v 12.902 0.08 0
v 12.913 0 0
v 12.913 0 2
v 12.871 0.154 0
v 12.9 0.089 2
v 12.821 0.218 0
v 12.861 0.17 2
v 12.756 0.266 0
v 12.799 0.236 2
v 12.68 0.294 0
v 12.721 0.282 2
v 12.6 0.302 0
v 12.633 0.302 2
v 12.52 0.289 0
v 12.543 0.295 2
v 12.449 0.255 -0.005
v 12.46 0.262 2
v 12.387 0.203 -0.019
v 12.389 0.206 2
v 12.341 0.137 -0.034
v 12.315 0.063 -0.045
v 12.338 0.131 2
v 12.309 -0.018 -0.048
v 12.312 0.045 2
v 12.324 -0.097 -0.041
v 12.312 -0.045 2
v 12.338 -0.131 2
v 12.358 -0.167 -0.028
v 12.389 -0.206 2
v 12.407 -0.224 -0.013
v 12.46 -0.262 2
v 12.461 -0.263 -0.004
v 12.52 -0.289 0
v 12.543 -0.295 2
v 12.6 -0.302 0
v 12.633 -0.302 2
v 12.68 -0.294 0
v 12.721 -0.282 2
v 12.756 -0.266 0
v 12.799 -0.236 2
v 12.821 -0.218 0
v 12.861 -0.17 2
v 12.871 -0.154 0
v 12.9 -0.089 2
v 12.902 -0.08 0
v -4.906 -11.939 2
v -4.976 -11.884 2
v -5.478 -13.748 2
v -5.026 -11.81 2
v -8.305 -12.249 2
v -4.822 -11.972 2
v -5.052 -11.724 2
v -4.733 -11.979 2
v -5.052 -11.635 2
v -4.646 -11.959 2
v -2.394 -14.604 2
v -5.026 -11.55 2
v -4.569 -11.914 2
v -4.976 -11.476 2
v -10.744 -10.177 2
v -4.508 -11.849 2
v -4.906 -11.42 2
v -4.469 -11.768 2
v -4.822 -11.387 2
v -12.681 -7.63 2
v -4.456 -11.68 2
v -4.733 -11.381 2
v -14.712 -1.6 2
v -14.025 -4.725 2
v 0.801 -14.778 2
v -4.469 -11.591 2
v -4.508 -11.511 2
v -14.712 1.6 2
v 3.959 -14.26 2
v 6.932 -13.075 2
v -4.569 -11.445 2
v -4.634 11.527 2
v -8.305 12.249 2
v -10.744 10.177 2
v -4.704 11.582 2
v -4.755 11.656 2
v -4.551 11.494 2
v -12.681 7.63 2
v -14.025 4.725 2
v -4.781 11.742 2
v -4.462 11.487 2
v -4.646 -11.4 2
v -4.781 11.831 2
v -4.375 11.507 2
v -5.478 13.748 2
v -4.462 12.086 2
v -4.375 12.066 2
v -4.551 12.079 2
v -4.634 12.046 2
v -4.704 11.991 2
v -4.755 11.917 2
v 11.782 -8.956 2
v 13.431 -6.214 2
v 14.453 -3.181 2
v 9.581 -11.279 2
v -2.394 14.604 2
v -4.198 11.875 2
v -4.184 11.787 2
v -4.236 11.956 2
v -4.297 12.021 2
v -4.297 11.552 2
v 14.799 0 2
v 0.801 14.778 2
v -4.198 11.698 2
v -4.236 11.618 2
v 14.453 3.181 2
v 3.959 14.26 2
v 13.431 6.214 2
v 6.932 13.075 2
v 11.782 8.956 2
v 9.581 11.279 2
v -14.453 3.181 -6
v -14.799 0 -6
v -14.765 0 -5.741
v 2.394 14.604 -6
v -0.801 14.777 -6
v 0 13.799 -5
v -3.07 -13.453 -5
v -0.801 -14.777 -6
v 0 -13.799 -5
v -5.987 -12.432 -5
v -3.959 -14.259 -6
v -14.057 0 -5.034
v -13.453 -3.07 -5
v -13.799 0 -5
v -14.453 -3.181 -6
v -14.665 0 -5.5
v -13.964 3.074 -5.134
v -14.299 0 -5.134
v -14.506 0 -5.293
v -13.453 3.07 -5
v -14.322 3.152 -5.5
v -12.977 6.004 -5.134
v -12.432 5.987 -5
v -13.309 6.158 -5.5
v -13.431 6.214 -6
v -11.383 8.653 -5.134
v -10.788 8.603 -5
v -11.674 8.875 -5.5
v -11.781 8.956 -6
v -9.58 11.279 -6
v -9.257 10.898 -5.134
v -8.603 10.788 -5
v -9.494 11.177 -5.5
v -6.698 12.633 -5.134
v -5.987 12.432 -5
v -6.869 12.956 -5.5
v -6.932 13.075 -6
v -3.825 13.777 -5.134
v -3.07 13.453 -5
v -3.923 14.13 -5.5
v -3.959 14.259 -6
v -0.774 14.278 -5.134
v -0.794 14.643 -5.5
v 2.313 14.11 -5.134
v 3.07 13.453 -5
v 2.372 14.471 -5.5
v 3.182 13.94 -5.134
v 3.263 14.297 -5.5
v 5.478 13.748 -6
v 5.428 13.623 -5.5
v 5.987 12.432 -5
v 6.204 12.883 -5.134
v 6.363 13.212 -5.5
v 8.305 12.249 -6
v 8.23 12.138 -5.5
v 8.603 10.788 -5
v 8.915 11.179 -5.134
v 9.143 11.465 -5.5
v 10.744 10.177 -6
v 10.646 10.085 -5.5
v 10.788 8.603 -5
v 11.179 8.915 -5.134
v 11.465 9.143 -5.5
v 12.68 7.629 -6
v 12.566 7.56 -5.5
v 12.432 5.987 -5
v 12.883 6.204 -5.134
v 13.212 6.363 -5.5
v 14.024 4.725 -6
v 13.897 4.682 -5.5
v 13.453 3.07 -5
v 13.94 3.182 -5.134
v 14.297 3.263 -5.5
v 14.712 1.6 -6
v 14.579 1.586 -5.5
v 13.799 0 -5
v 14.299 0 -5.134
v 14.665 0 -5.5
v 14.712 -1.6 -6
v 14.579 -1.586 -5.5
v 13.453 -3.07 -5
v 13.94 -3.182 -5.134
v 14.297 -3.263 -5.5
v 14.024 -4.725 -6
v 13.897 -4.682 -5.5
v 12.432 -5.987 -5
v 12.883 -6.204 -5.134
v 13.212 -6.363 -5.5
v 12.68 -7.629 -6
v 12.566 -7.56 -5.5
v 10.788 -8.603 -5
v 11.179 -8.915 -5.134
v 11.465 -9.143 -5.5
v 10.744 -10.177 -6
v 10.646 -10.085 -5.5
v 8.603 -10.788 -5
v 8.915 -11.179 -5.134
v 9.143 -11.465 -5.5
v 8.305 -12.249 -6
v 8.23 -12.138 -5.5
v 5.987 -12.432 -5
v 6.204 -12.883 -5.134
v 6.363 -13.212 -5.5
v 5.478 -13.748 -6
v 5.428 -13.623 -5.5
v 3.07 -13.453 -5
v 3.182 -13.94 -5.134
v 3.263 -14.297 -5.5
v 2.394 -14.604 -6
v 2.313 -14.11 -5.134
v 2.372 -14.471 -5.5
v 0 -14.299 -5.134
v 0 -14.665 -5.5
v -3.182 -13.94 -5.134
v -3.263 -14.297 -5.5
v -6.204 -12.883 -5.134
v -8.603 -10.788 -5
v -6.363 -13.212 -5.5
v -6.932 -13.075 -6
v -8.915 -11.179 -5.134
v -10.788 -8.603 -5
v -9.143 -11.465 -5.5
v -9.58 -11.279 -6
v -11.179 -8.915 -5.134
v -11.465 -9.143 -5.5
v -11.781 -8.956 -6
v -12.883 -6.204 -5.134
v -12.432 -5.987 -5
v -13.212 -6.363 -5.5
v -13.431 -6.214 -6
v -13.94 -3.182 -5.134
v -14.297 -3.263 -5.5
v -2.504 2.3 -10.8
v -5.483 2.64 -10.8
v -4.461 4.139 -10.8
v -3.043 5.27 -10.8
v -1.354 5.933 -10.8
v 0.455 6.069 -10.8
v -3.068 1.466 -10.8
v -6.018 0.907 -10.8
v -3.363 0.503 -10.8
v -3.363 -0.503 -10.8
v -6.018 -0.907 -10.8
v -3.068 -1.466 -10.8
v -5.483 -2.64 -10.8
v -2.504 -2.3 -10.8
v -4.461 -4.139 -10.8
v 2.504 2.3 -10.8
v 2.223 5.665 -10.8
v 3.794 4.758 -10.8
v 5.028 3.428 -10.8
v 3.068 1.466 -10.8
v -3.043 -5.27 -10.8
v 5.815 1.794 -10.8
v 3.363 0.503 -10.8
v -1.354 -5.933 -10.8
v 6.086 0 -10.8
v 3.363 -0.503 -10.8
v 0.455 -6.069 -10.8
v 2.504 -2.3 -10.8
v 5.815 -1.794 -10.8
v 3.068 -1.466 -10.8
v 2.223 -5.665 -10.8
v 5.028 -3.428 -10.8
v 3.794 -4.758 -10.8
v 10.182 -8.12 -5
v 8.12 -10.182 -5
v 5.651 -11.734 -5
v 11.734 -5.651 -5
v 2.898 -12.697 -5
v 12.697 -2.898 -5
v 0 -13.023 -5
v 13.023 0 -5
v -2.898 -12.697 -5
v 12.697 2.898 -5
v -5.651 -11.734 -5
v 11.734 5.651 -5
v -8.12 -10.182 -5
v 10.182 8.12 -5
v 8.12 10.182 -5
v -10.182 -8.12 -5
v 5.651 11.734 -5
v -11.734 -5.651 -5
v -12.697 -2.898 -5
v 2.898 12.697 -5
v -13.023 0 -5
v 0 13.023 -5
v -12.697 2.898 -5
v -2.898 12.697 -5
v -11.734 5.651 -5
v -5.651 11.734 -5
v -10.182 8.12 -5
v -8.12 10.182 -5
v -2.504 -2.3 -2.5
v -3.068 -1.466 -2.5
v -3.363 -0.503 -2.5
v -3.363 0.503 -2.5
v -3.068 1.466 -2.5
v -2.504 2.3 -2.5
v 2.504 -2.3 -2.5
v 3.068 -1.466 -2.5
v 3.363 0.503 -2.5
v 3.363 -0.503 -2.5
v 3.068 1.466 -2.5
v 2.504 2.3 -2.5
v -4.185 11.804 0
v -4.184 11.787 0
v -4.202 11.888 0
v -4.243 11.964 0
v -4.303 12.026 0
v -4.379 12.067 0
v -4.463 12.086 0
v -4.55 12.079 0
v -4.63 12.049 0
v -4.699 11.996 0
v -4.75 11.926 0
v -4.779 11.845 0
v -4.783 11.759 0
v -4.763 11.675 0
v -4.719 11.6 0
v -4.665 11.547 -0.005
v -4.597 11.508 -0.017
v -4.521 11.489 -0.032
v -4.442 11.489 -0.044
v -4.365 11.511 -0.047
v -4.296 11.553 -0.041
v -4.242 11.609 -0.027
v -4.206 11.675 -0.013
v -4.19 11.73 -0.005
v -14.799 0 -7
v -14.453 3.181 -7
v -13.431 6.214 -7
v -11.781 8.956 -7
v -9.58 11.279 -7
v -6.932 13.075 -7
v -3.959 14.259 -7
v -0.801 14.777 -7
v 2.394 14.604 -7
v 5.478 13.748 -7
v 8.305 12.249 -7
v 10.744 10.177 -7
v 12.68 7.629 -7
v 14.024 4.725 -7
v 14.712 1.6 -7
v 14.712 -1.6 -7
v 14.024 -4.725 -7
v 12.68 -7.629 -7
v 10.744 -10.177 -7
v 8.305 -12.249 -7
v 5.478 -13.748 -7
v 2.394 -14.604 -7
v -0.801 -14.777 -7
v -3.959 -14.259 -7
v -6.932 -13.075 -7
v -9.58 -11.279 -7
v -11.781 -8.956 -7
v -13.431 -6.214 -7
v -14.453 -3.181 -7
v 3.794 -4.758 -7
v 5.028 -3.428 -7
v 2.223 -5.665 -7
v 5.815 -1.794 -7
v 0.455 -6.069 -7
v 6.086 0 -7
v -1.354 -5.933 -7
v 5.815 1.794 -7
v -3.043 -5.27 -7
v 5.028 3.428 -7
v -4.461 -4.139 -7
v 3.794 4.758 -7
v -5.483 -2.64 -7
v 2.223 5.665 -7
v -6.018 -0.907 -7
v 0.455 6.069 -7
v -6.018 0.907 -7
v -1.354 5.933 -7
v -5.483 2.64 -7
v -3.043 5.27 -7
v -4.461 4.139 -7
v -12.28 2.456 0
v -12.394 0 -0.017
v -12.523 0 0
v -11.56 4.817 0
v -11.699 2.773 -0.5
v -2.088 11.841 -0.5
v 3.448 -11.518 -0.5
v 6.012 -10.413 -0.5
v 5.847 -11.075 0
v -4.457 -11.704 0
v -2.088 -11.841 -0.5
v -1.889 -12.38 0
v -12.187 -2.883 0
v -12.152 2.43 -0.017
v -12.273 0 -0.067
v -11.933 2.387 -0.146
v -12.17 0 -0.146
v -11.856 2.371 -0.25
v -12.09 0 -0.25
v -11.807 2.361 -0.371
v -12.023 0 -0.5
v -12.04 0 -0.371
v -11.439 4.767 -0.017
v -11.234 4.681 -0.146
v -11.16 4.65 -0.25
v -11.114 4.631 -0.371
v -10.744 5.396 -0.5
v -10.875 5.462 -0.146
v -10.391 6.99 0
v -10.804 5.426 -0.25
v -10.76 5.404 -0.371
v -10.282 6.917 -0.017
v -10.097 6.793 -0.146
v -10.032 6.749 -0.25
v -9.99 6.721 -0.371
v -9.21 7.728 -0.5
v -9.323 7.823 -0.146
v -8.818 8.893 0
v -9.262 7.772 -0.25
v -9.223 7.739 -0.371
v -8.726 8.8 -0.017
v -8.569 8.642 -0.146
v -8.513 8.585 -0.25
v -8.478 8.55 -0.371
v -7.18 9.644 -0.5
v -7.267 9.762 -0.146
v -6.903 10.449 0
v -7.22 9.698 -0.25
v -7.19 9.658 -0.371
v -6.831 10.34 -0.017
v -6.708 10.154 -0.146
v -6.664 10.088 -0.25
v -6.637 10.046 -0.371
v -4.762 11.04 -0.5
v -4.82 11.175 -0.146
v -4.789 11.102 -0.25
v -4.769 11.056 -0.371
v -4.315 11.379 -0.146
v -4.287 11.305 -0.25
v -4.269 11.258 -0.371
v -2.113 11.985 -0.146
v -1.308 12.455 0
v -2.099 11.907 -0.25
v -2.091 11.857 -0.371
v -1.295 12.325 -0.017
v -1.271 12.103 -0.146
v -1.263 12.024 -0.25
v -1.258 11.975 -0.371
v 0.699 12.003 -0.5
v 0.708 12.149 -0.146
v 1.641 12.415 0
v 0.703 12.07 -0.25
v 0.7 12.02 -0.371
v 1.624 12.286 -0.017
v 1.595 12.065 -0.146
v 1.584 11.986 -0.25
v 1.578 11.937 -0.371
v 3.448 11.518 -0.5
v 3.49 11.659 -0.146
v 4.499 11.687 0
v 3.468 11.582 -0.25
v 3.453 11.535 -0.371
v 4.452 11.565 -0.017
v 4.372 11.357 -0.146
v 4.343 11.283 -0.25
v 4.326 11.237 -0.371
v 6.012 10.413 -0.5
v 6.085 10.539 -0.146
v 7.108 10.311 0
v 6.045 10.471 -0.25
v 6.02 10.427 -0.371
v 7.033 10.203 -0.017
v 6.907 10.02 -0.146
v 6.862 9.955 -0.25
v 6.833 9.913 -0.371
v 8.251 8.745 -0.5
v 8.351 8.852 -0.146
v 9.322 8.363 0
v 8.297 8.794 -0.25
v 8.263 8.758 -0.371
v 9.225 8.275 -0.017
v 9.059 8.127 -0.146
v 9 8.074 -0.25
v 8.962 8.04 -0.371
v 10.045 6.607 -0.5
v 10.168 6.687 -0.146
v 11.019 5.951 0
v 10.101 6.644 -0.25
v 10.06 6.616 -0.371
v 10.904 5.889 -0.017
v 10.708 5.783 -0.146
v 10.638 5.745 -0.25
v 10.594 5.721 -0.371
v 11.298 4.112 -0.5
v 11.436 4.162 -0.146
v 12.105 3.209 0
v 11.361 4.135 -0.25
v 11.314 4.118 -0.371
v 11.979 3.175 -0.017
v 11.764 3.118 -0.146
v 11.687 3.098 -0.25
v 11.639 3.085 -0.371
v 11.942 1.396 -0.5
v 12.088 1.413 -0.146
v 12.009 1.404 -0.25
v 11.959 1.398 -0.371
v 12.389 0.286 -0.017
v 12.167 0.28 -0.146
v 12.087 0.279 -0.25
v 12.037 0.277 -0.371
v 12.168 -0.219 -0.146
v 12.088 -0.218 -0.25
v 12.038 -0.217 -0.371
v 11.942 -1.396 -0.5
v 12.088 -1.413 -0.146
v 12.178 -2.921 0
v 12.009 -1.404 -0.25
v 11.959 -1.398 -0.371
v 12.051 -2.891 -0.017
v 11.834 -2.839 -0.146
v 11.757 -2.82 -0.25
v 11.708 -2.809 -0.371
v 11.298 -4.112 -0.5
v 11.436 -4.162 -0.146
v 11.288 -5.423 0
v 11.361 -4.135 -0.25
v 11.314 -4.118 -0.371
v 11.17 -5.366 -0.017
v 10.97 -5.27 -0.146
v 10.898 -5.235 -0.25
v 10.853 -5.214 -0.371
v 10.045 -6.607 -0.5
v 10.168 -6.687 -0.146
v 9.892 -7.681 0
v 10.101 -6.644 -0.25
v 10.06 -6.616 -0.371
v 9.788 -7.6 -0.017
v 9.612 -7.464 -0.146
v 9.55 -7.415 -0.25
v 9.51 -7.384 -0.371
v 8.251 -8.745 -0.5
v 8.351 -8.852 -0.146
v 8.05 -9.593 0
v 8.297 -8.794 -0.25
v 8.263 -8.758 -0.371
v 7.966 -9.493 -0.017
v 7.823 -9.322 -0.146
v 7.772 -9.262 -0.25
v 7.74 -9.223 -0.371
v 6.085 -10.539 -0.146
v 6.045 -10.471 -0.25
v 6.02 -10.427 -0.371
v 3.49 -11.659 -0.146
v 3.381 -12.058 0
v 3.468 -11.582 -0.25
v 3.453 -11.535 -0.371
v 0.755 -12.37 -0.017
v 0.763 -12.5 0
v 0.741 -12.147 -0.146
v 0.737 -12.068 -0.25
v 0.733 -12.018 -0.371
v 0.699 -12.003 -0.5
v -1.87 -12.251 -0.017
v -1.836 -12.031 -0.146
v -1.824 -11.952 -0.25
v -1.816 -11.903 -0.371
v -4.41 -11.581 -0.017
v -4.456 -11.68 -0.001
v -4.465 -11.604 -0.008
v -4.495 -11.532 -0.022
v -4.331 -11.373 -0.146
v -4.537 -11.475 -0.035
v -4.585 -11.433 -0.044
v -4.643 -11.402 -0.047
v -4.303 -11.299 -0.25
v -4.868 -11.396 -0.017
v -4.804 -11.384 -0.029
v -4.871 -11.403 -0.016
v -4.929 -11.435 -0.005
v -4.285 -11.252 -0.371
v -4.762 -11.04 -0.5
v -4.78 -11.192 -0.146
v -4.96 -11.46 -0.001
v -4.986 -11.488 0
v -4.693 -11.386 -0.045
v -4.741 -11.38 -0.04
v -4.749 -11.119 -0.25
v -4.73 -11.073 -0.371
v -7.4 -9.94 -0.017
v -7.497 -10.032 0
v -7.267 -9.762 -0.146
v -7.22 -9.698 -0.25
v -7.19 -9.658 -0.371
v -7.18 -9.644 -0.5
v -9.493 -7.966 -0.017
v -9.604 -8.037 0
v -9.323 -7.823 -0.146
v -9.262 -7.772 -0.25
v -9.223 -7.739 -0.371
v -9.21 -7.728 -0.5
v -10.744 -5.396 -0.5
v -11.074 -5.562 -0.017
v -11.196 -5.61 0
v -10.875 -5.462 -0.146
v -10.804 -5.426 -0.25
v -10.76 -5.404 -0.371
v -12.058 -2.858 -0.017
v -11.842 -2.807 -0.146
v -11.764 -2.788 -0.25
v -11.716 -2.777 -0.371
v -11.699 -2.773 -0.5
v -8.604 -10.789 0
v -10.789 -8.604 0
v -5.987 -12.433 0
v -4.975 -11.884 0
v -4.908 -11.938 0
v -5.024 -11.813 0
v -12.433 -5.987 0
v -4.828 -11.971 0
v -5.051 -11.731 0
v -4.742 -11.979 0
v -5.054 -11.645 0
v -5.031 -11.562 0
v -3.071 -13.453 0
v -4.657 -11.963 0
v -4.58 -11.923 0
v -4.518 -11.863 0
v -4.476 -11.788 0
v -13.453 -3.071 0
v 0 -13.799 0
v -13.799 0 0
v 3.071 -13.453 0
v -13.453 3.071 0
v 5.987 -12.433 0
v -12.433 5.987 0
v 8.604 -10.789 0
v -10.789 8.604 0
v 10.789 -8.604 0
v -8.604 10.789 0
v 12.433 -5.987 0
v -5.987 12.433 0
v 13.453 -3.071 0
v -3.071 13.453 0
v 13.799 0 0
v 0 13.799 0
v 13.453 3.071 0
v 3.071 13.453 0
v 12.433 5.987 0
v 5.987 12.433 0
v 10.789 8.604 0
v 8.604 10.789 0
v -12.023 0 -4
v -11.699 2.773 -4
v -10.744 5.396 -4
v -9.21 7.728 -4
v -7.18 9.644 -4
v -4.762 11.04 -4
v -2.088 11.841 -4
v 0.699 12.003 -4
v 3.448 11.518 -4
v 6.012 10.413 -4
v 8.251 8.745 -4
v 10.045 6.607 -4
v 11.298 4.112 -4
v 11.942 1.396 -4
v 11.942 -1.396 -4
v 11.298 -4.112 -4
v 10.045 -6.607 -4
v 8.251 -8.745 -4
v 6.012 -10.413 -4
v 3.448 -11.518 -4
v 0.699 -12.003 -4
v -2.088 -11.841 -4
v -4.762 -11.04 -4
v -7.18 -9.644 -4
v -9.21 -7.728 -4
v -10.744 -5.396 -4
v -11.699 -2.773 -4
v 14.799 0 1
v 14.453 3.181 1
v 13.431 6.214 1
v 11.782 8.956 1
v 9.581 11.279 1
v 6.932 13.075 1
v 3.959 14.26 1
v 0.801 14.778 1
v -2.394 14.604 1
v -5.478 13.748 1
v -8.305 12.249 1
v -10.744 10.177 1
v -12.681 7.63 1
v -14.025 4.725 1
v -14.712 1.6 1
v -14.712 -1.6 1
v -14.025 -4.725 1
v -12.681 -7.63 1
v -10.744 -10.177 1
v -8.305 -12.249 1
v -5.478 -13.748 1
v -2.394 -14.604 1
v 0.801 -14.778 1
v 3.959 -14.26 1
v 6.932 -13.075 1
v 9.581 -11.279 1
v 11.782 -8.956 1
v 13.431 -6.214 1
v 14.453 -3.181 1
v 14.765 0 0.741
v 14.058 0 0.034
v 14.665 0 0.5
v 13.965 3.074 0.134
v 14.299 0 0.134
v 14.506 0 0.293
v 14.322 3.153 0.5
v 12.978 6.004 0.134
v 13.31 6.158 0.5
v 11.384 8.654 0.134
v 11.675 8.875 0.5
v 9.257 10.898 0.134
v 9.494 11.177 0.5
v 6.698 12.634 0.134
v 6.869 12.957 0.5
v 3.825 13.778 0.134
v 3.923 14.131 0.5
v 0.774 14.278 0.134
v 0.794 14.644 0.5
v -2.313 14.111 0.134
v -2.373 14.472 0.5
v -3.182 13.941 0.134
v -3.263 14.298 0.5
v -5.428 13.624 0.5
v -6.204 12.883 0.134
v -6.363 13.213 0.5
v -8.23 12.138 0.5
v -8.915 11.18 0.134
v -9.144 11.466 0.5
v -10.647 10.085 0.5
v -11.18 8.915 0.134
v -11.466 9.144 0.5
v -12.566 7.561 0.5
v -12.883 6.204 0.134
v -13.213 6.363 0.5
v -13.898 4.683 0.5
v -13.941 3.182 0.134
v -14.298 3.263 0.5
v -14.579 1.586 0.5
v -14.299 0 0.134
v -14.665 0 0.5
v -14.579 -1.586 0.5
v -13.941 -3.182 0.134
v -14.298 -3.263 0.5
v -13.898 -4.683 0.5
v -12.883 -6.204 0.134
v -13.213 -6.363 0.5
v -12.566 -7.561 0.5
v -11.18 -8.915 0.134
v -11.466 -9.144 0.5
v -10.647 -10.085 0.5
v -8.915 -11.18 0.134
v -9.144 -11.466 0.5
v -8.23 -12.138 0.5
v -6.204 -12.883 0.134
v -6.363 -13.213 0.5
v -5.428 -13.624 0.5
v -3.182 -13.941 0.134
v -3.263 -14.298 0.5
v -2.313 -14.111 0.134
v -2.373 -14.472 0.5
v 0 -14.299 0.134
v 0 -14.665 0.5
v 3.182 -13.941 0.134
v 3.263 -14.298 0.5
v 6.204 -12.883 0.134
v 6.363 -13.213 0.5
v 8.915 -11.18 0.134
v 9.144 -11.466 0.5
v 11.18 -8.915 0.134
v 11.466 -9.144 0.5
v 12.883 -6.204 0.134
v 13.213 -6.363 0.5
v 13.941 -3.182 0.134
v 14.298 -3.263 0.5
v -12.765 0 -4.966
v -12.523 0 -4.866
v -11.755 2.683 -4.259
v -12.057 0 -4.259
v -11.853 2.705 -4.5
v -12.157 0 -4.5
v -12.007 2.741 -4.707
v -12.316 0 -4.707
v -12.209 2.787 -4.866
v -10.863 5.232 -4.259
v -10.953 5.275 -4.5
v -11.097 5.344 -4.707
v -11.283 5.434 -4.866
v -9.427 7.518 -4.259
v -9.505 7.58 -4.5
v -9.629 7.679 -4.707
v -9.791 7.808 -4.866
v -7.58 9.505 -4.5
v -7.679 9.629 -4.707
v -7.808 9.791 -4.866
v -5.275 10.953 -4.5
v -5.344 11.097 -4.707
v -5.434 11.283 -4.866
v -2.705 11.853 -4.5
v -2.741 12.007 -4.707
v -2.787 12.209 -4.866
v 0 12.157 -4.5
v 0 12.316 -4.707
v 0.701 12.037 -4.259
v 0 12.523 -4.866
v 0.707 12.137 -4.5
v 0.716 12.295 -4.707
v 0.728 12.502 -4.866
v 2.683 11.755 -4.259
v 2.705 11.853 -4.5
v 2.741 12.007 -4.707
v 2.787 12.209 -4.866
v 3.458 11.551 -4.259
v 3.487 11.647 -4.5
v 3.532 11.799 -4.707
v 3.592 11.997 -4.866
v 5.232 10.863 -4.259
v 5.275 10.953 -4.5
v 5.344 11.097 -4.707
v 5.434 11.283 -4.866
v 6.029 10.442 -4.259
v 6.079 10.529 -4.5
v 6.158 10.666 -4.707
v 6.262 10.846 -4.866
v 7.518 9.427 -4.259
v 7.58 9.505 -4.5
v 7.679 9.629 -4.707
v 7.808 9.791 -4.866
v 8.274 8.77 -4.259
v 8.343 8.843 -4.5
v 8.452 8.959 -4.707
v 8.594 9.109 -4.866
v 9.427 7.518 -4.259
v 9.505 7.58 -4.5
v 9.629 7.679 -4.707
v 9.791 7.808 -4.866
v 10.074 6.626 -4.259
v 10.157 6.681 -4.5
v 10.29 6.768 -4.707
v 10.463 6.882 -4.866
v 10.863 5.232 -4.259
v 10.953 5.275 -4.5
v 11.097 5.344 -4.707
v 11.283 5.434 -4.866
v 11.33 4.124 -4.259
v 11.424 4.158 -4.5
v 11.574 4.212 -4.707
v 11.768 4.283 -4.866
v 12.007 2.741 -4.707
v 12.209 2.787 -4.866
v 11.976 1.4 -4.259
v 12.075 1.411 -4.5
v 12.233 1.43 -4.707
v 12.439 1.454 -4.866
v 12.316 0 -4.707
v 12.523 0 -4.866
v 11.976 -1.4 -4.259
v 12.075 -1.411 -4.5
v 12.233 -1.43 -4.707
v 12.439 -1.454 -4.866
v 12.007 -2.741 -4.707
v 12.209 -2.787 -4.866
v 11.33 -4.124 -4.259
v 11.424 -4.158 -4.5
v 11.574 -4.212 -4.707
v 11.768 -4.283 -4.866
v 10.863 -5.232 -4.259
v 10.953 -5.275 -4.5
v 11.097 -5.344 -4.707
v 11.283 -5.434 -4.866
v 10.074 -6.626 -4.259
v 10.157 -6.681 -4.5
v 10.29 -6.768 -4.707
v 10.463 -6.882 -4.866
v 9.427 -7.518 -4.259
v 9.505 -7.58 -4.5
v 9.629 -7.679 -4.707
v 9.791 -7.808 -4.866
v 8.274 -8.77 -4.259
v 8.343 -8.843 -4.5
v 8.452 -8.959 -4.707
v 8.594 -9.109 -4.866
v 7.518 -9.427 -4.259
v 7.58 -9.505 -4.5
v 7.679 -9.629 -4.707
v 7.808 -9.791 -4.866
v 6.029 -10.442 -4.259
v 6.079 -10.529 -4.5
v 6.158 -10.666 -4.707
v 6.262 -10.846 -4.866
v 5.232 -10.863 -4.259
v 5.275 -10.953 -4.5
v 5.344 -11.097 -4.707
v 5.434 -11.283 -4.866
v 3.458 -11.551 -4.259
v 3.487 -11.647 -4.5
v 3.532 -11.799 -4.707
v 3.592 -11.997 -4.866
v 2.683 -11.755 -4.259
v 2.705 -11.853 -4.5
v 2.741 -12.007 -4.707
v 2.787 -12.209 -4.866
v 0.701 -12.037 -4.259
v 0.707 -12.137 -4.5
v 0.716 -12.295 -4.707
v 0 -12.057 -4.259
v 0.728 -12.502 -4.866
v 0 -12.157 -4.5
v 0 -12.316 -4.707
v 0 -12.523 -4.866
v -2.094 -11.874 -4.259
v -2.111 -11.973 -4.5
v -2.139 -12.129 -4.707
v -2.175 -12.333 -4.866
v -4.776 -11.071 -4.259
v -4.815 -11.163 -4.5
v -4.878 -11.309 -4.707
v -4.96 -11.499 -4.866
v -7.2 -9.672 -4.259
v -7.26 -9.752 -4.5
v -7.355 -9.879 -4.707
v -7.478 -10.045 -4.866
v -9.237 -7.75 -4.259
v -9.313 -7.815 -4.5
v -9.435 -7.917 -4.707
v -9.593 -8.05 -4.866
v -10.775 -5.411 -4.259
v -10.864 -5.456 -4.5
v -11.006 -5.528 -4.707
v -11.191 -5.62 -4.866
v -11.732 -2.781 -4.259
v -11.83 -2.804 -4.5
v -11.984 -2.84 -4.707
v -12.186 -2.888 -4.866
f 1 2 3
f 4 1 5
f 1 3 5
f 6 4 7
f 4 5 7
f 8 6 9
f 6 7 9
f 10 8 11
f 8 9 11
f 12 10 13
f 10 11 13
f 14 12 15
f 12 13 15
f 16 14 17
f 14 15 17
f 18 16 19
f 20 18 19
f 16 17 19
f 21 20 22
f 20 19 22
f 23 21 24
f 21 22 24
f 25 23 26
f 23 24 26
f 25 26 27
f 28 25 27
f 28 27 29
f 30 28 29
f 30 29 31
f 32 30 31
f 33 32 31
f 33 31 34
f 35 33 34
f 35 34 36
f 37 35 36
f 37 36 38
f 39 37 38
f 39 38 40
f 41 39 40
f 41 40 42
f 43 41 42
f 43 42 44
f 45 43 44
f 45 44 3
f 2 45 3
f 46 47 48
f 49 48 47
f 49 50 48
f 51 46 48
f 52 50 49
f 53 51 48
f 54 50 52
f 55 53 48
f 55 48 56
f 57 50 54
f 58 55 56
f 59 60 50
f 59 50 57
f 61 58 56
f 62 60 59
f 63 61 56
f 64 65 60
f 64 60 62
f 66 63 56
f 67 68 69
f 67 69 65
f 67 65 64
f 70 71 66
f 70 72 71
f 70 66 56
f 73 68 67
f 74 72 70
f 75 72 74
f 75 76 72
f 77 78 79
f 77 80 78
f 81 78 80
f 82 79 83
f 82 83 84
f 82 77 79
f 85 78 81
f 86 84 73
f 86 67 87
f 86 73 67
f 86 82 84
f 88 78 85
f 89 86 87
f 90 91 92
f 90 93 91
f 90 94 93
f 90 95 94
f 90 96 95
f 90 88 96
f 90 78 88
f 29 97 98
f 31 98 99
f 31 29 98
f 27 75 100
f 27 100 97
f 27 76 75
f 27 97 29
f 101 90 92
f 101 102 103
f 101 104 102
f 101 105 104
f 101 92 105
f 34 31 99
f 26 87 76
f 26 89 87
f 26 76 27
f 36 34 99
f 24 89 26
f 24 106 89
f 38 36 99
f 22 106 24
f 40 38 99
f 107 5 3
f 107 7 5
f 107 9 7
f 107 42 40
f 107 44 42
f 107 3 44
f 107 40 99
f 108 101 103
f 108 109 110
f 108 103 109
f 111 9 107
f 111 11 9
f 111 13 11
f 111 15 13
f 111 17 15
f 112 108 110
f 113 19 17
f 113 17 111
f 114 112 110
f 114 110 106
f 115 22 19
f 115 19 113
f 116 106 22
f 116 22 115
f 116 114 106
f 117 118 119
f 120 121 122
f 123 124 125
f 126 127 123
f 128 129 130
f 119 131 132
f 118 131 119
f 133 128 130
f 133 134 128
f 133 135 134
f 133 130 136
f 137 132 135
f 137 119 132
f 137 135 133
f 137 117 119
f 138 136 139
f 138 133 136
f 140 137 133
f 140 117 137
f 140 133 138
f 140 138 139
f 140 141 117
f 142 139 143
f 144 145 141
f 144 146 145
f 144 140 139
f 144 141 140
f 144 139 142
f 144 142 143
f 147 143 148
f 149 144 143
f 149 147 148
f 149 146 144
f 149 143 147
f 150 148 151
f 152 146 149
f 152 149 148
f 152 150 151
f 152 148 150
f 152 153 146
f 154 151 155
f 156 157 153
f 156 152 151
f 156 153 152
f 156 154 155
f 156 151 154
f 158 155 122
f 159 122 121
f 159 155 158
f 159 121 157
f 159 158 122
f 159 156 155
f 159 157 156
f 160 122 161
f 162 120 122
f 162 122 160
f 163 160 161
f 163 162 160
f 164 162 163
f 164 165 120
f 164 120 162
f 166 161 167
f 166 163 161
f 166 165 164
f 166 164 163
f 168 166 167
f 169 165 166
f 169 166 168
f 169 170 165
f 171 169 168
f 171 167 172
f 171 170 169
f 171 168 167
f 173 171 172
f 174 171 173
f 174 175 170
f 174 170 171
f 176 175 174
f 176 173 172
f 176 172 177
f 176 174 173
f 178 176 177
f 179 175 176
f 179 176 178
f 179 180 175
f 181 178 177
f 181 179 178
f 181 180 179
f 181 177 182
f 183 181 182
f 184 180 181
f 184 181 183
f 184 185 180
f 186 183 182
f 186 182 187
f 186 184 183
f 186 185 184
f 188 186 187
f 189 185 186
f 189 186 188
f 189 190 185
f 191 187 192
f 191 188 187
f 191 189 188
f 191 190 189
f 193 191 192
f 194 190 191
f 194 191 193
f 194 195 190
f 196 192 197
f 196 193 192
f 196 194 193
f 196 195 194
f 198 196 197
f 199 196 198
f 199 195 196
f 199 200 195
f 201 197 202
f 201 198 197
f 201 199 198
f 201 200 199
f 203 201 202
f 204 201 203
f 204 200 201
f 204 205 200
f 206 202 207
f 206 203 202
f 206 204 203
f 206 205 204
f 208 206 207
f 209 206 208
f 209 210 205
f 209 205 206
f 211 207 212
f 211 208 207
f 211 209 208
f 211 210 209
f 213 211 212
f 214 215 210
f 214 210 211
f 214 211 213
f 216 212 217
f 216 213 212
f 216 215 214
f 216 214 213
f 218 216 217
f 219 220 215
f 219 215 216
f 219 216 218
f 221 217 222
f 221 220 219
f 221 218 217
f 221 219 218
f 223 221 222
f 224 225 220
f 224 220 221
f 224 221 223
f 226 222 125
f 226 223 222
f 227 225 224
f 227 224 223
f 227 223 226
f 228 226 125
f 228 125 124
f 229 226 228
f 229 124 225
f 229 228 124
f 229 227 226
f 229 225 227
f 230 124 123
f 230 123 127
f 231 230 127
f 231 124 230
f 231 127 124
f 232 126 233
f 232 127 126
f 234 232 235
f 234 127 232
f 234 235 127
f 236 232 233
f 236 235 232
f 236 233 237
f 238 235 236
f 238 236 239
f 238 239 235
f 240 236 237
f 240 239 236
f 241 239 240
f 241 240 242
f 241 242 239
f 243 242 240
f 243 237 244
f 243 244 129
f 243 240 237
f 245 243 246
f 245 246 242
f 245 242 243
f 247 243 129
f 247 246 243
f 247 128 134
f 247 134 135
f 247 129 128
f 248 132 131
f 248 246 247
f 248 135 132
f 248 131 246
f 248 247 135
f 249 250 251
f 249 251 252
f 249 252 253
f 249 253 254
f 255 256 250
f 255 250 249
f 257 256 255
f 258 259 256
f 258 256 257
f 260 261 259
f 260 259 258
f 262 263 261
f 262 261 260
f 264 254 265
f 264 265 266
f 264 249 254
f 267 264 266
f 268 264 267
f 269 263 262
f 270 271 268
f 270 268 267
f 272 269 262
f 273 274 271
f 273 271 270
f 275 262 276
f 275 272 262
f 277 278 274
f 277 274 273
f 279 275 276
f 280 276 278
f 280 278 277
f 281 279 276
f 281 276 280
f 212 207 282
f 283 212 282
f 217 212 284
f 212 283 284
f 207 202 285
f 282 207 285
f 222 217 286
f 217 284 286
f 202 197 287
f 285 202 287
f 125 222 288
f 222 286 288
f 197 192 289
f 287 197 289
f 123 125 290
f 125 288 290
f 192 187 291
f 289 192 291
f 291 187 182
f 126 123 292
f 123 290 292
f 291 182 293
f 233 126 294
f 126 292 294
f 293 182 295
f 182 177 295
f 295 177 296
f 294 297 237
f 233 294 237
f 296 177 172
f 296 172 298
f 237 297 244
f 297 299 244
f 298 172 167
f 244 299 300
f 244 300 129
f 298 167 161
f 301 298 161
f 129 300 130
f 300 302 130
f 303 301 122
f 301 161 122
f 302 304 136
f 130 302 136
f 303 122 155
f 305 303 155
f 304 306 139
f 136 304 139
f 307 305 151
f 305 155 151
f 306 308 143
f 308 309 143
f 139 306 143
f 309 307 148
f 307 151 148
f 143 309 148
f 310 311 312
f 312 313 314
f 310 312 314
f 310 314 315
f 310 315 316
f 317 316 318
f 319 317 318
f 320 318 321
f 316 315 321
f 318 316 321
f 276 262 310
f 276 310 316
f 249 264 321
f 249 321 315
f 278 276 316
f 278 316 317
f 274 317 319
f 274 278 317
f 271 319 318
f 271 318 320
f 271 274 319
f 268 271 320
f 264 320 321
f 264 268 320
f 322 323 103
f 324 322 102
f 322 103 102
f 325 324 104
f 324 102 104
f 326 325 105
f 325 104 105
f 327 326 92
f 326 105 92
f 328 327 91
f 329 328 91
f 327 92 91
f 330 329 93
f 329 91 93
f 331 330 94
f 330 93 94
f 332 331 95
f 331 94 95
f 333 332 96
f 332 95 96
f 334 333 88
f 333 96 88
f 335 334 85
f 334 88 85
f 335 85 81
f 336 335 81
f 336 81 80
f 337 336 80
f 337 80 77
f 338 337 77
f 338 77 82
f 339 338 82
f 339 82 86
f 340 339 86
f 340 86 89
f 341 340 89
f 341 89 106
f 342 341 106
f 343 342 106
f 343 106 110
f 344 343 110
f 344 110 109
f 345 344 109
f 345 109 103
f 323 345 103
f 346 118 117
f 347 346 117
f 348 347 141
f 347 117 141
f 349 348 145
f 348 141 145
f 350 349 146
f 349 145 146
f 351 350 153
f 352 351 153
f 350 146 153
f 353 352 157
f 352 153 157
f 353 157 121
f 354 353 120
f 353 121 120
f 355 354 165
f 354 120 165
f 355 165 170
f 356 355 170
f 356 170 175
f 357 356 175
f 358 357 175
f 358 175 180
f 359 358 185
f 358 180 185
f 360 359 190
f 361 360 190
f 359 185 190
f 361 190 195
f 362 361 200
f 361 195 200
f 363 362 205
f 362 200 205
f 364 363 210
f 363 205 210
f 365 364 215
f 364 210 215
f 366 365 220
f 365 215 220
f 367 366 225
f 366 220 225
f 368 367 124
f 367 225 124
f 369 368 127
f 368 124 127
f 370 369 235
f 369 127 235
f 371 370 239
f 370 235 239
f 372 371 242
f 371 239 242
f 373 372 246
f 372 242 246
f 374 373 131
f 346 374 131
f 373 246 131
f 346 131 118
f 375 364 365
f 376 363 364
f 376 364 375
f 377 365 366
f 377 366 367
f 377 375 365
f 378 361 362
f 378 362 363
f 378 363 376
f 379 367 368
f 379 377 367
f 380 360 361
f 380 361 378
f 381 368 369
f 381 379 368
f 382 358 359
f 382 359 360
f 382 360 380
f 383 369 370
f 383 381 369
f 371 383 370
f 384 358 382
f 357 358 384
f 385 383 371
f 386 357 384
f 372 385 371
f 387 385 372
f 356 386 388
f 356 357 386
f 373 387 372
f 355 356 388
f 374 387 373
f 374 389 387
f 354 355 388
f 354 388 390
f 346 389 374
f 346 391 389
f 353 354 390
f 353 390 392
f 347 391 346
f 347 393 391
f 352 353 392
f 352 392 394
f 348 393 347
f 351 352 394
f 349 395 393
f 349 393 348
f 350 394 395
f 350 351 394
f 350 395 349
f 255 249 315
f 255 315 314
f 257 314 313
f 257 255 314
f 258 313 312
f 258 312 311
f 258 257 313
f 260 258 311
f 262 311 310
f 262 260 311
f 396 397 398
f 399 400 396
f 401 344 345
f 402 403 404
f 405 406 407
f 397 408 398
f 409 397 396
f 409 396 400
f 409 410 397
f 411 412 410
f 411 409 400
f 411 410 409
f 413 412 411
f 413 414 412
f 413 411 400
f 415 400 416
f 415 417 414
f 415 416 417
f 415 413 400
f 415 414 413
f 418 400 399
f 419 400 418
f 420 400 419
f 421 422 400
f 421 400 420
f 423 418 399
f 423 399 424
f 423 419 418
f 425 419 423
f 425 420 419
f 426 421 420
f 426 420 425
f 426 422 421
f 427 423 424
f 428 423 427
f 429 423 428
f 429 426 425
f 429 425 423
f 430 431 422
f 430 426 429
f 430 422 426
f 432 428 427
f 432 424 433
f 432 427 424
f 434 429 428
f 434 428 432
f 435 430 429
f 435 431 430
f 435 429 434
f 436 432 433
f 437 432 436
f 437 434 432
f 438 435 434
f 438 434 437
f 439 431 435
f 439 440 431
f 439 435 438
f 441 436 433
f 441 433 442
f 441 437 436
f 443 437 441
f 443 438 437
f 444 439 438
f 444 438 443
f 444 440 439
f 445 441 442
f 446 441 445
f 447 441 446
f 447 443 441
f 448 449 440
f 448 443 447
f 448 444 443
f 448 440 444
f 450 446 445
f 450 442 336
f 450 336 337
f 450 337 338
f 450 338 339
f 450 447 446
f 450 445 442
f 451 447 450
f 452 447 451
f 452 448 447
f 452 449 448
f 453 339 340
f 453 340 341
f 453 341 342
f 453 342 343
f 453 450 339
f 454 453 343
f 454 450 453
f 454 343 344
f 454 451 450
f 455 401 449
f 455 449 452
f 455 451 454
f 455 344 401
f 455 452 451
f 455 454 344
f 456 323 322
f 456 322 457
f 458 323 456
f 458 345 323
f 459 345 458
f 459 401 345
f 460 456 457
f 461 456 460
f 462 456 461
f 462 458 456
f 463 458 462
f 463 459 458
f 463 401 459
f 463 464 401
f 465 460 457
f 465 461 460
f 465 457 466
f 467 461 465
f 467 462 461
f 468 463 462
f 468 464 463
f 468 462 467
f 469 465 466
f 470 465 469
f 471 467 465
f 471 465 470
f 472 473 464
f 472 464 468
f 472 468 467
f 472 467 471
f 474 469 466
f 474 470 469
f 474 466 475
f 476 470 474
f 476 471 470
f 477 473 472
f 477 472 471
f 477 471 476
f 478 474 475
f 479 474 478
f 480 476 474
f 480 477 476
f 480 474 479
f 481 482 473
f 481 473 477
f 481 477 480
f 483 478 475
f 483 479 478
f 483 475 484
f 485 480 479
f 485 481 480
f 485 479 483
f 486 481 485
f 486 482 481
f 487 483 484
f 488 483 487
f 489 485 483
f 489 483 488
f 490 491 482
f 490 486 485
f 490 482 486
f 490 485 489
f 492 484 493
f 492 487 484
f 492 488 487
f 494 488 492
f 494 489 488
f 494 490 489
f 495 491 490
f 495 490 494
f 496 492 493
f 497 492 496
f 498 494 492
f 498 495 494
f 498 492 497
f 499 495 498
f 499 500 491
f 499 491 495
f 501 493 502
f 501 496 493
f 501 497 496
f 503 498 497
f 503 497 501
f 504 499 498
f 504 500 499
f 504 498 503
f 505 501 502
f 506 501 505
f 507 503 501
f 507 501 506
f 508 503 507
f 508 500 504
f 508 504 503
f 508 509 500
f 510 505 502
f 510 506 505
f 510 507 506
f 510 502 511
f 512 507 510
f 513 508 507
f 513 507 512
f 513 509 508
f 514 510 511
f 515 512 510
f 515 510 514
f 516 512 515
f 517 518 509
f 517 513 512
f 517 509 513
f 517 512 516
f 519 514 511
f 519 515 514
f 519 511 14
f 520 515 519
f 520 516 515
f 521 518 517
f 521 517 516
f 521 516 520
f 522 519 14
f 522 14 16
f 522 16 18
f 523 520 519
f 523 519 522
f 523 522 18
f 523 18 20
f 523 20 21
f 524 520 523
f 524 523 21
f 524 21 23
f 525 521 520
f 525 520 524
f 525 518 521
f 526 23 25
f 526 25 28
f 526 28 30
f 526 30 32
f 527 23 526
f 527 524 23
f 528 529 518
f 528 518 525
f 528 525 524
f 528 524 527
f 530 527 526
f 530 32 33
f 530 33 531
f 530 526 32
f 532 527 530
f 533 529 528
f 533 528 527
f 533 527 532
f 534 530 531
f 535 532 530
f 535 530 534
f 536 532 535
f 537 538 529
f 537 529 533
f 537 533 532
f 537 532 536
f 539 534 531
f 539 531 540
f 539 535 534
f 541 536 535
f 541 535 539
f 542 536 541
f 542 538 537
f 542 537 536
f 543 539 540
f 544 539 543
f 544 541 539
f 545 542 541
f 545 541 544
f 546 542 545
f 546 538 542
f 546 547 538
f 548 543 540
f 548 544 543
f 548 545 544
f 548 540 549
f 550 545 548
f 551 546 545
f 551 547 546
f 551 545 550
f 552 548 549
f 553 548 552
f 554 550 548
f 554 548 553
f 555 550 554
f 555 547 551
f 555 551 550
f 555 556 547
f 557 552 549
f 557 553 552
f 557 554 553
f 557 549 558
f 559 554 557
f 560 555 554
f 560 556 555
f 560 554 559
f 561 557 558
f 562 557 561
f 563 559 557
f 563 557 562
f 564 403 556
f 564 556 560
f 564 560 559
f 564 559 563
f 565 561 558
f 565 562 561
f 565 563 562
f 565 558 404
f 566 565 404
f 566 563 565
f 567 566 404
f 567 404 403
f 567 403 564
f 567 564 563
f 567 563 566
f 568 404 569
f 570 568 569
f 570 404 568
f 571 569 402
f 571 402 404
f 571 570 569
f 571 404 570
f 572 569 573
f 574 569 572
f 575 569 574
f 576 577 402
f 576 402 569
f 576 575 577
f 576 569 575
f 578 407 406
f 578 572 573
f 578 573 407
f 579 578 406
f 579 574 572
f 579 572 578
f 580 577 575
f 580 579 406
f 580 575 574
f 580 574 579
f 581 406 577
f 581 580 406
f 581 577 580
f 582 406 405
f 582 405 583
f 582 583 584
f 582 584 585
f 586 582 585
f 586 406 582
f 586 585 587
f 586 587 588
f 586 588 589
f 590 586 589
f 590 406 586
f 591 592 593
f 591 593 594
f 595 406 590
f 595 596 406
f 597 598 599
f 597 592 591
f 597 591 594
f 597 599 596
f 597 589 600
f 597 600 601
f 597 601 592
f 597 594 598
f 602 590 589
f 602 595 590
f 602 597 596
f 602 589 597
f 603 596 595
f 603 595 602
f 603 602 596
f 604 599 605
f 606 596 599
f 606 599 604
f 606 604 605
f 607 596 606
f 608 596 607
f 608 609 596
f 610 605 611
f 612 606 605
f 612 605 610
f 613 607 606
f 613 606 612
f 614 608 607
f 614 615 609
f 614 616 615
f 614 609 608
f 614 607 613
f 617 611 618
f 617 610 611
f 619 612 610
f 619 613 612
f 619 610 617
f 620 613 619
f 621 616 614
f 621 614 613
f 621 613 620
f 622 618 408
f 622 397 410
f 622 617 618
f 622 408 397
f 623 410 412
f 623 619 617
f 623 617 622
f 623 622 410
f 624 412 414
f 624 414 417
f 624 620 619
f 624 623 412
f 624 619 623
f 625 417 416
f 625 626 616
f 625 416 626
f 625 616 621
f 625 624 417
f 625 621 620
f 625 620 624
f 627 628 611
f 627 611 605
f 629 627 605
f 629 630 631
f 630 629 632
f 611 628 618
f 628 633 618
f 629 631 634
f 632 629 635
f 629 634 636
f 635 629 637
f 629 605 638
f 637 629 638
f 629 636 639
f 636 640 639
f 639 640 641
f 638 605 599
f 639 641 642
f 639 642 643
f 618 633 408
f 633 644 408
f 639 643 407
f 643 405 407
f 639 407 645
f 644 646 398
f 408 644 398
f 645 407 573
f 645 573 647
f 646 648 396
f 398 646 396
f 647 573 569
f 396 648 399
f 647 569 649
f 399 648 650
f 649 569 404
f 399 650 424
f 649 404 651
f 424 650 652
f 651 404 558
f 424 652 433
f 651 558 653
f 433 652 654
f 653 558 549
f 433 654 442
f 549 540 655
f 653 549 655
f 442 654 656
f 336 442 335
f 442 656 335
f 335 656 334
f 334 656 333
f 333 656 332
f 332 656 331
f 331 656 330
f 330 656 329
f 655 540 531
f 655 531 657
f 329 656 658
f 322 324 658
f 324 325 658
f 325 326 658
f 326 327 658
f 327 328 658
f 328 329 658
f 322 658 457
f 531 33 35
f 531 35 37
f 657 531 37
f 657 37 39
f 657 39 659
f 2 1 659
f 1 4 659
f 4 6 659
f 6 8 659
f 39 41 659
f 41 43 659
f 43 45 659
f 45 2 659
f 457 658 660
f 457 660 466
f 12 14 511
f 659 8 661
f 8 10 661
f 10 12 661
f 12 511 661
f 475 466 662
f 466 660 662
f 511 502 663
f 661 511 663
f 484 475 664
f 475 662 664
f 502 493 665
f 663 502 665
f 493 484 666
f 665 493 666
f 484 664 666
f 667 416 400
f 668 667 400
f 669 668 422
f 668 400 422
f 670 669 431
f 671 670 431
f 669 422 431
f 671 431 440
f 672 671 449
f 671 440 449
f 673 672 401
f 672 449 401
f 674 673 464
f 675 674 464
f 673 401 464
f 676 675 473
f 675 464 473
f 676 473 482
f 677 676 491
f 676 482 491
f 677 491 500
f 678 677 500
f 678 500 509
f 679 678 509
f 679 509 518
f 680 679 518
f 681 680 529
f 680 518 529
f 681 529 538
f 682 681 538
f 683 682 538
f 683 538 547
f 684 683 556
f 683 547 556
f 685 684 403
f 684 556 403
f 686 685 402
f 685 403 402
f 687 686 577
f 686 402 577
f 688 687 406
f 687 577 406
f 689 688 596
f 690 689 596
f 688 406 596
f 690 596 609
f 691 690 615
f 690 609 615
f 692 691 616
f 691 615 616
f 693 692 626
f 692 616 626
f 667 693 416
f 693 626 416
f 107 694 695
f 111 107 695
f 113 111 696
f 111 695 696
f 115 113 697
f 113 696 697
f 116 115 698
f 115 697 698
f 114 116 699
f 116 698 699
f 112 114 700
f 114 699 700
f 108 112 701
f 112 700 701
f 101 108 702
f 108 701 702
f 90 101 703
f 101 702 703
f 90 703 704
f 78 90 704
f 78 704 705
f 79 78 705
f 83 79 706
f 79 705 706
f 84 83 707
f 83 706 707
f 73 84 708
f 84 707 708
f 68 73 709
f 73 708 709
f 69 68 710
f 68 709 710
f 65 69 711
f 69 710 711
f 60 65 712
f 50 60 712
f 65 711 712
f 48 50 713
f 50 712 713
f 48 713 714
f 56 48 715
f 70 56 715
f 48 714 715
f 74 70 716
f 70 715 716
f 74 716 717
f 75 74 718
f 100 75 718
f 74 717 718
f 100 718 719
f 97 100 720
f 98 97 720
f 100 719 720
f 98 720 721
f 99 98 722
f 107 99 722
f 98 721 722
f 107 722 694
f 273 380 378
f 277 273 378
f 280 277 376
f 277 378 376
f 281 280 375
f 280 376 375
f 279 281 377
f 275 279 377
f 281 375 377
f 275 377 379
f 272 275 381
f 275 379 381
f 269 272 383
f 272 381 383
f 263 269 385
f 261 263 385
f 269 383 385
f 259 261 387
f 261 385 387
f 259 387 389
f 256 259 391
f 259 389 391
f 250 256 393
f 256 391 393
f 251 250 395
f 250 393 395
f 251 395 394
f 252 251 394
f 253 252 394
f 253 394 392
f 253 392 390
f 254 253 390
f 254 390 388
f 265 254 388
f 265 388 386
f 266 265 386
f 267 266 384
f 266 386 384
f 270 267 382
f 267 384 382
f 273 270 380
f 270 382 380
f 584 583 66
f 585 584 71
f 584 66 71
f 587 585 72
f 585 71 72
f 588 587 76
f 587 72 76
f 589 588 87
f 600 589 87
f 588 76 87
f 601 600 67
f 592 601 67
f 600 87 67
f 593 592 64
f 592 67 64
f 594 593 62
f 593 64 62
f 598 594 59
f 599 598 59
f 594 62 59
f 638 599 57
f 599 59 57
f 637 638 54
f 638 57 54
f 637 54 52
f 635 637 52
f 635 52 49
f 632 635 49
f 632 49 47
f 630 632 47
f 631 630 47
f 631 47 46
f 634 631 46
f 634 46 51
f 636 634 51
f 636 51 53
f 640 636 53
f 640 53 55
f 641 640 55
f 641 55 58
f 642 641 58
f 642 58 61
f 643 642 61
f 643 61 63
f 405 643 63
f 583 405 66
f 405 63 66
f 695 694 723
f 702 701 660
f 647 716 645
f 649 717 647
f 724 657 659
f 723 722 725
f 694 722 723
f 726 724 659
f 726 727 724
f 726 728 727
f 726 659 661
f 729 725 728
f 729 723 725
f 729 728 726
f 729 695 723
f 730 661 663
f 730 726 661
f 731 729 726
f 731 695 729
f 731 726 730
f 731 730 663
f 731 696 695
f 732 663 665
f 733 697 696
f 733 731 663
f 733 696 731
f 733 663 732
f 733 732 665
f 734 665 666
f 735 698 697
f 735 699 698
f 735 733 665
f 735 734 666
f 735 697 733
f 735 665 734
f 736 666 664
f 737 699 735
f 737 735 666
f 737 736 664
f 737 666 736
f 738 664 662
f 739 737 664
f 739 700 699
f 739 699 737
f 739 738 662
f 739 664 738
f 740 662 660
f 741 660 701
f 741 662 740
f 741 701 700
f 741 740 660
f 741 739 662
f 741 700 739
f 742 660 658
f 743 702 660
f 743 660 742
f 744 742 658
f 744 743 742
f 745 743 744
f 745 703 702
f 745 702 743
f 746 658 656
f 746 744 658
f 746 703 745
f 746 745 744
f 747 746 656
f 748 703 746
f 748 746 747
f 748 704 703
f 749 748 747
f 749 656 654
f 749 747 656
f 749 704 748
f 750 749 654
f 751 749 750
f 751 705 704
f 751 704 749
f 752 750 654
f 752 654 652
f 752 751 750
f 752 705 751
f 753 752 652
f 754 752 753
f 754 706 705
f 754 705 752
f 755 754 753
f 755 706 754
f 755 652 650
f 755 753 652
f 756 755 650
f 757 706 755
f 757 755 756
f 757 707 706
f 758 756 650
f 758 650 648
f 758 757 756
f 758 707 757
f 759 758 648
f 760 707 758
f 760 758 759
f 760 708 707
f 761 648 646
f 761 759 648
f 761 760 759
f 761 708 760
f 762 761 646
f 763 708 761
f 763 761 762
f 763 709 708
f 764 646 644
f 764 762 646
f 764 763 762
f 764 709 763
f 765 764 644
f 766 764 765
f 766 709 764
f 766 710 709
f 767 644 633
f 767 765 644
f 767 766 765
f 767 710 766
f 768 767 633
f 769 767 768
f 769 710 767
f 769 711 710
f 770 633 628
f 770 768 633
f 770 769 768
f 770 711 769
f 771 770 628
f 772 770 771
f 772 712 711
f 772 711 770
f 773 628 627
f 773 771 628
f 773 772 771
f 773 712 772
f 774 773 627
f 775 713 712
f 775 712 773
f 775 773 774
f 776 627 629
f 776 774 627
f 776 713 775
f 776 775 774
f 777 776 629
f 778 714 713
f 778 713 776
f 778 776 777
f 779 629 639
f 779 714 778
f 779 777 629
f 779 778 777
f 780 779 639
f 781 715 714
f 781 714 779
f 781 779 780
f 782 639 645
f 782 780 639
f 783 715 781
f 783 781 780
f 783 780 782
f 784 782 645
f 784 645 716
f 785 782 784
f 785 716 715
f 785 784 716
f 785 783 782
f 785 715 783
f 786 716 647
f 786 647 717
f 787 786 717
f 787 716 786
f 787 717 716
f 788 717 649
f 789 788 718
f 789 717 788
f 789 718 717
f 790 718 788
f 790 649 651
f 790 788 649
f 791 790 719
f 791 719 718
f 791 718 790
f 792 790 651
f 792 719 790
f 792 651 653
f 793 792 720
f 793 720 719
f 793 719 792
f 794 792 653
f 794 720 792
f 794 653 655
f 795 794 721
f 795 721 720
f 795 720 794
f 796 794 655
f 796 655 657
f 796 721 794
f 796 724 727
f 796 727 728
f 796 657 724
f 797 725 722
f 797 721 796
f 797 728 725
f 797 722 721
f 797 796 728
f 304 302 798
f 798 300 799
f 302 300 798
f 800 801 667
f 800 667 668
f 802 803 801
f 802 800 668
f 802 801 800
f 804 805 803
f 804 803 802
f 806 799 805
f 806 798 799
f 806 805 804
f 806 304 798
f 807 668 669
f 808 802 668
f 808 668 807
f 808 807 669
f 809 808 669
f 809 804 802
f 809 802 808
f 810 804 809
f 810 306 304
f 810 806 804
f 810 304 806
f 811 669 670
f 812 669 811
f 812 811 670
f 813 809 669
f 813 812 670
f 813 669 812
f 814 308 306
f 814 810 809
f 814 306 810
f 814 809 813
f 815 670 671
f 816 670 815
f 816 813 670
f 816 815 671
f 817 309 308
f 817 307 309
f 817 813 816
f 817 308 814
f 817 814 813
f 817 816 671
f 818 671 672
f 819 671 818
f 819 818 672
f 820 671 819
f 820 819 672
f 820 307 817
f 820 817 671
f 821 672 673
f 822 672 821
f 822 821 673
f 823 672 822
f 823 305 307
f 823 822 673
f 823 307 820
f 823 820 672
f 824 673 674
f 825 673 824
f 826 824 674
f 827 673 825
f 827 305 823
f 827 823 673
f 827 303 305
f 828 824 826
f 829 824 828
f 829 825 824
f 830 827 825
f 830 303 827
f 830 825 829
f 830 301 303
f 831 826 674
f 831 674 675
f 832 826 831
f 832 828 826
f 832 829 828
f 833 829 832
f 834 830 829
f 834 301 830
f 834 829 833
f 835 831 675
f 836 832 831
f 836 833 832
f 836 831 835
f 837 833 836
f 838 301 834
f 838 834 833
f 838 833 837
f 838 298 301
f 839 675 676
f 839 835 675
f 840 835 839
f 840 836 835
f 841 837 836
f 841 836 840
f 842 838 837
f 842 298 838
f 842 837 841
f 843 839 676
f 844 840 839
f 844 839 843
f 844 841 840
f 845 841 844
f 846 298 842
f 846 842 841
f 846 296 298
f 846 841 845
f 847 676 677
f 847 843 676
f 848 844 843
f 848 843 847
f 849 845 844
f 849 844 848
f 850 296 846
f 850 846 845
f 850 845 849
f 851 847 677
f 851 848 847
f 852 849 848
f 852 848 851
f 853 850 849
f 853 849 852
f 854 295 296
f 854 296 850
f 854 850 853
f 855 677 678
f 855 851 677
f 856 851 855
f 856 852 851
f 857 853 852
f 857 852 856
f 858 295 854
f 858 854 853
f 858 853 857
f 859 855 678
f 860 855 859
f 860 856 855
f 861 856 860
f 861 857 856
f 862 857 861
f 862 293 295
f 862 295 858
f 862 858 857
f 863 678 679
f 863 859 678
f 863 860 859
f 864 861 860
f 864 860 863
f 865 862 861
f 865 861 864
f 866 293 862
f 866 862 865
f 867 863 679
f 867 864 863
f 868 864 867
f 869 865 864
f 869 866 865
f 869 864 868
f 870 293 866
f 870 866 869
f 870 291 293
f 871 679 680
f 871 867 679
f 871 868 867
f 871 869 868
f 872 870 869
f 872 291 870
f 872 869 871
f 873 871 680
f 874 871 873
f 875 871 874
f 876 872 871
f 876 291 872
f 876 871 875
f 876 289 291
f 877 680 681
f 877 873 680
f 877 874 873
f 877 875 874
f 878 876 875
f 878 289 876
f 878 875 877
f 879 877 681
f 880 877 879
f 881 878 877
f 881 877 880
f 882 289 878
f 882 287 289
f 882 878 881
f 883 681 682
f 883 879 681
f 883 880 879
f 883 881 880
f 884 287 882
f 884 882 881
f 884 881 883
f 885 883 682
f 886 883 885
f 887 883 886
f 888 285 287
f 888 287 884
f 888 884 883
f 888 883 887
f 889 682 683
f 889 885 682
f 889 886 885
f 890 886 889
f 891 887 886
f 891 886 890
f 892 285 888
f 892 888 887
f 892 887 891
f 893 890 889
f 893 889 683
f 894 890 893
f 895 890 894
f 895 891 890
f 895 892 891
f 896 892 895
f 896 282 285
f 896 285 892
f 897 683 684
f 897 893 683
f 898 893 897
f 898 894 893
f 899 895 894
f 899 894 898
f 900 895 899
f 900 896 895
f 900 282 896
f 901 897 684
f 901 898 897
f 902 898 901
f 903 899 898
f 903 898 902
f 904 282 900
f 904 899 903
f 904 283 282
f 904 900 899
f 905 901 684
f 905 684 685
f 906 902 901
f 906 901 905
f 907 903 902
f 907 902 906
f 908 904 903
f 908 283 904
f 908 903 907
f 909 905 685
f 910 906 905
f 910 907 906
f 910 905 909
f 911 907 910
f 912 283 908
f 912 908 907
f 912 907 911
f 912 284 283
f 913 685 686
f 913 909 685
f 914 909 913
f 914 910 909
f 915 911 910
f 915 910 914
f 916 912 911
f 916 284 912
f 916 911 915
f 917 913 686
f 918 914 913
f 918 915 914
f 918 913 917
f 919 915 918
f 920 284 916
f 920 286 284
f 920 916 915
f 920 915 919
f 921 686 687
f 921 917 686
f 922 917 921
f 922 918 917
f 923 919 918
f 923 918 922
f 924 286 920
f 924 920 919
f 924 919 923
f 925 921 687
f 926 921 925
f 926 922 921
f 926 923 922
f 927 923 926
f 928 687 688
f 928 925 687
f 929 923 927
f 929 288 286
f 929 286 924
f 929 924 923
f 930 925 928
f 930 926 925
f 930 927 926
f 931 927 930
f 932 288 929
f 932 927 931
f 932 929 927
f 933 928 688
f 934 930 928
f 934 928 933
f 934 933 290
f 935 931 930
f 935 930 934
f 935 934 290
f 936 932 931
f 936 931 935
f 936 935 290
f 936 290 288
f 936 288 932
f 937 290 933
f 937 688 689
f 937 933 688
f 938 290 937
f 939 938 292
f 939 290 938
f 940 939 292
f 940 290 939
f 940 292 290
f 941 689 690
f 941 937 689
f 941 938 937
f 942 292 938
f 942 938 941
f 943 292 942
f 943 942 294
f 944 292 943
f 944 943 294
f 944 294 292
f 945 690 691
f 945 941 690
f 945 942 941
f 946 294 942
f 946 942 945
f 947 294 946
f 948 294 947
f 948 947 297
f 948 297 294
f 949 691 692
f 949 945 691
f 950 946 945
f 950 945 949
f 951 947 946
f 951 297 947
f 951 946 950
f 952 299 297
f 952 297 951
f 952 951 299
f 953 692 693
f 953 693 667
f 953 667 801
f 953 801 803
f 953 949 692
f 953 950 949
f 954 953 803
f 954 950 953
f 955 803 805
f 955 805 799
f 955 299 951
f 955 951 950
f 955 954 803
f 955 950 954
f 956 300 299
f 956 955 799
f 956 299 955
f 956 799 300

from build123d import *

# Parameters (mm, degrees)
SKETCH1_R           = 14.799242092
BOSS_EXTRUDE1_DEPTH = 2
SKETCH2_R           = 12.023378779
BOSS_EXTRUDE2_DEPTH = 5
SKETCH3_R           = 14.798614579
BOSS_EXTRUDE3_DEPTH = 2
SKETCH4_R           = 6.085537025
BOSS_EXTRUDE5_DEPTH = 3.8
FILLET5_R           = 1
FILLET6_R           = 0.5
CUT_EXTRUDE1_DEPTH  = 8.3
SKETCH8_R           = 0.302475122
SKETCH8_R_2         = 0.3
CUT_EXTRUDE3_DEPTH  = 2.3
FILLET7_R           = 1
FILLET8_R           = 1


with BuildPart() as part:
    # Sketch1 → Boss-Extrude1 (new body)
    with BuildSketch(Plane.XY):
        Circle(SKETCH1_R)
    extrude(amount=BOSS_EXTRUDE1_DEPTH)

    # Sketch2 → Boss-Extrude2 (add)
    with BuildSketch(Plane(origin=(0, 0, 0), x_dir=(-1, 0, 0), z_dir=(0, 0, -1))):
        Circle(SKETCH2_R)
    extrude(amount=BOSS_EXTRUDE2_DEPTH)

    # Sketch3 → Boss-Extrude3 (add)
    with BuildSketch(Plane(origin=(0, 0, -5), x_dir=(-1, 0, 0), z_dir=(0, 0, -1))):
        Circle(SKETCH3_R)
    extrude(amount=BOSS_EXTRUDE3_DEPTH)

    # Sketch4 → Boss-Extrude5 (add)
    with BuildSketch(Plane(origin=(0, 0, -7), x_dir=(-1, 0, 0), z_dir=(0, 0, -1))):
        with Locations(Location((0, 0, 0), (0, 0, 180))):
            Circle(SKETCH4_R)
    extrude(amount=BOSS_EXTRUDE5_DEPTH)

    # Fillet5
    fillet5_edges = [part.edges().sort_by_distance(p)[0] for p in [
        (-14.799242092, 0, 0),
    ]]
    fillet(fillet5_edges, radius=FILLET5_R)

    # Fillet6
    fillet6_edges = [part.edges().sort_by_distance(p)[0] for p in [
        (12.023378779, 0, 0),
    ]]
    fillet(fillet6_edges, radius=FILLET6_R)

    # Sketch7 → Cut-Extrude1 (cut)
    with BuildSketch(Plane(origin=(0, 0, -10.8), x_dir=(-1, 0, 0), z_dir=(0, 0, -1))):
        with BuildLine():
            Line((0, -2.3), (-2.503996805, -2.3))
            ThreePointArc((-2.503996805, -2.3), (-3.4, 0), (-2.503996805, 2.3))
            Line((-2.503996805, 2.3), (0, 2.3))
            Line((0, 2.3), (2.503996805, 2.3))
            ThreePointArc((2.503996805, 2.3), (3.4, 0), (2.503996805, -2.3))
            Line((2.503996805, -2.3), (0, -2.3))
        make_face()
    extrude(amount=-CUT_EXTRUDE1_DEPTH, mode=Mode.SUBTRACT)

    # Sketch8 → Cut-Extrude3 (cut)
    with BuildSketch(Plane.XY.offset(2)):
        with Locations((12.610771715, 0)):
            Circle(SKETCH8_R)
        with Locations((-4.484302396, 11.786542974)):
            Circle(SKETCH8_R_2)
        with Locations((-4.755704429, -11.679676307)):
            Circle(SKETCH8_R_2)
    extrude(amount=-CUT_EXTRUDE3_DEPTH, mode=Mode.SUBTRACT)

    # Fillet7
    fillet7_edges = [part.edges().sort_by_distance(p)[0] for p in [
        (12.023378779, 0, -5),
    ]]
    fillet(fillet7_edges, radius=FILLET7_R)

    # Fillet8
    fillet8_edges = [part.edges().sort_by_distance(p)[0] for p in [
        (14.798614579, 0, -5),
    ]]
    fillet(fillet8_edges, radius=FILLET8_R)


solid = part.part
